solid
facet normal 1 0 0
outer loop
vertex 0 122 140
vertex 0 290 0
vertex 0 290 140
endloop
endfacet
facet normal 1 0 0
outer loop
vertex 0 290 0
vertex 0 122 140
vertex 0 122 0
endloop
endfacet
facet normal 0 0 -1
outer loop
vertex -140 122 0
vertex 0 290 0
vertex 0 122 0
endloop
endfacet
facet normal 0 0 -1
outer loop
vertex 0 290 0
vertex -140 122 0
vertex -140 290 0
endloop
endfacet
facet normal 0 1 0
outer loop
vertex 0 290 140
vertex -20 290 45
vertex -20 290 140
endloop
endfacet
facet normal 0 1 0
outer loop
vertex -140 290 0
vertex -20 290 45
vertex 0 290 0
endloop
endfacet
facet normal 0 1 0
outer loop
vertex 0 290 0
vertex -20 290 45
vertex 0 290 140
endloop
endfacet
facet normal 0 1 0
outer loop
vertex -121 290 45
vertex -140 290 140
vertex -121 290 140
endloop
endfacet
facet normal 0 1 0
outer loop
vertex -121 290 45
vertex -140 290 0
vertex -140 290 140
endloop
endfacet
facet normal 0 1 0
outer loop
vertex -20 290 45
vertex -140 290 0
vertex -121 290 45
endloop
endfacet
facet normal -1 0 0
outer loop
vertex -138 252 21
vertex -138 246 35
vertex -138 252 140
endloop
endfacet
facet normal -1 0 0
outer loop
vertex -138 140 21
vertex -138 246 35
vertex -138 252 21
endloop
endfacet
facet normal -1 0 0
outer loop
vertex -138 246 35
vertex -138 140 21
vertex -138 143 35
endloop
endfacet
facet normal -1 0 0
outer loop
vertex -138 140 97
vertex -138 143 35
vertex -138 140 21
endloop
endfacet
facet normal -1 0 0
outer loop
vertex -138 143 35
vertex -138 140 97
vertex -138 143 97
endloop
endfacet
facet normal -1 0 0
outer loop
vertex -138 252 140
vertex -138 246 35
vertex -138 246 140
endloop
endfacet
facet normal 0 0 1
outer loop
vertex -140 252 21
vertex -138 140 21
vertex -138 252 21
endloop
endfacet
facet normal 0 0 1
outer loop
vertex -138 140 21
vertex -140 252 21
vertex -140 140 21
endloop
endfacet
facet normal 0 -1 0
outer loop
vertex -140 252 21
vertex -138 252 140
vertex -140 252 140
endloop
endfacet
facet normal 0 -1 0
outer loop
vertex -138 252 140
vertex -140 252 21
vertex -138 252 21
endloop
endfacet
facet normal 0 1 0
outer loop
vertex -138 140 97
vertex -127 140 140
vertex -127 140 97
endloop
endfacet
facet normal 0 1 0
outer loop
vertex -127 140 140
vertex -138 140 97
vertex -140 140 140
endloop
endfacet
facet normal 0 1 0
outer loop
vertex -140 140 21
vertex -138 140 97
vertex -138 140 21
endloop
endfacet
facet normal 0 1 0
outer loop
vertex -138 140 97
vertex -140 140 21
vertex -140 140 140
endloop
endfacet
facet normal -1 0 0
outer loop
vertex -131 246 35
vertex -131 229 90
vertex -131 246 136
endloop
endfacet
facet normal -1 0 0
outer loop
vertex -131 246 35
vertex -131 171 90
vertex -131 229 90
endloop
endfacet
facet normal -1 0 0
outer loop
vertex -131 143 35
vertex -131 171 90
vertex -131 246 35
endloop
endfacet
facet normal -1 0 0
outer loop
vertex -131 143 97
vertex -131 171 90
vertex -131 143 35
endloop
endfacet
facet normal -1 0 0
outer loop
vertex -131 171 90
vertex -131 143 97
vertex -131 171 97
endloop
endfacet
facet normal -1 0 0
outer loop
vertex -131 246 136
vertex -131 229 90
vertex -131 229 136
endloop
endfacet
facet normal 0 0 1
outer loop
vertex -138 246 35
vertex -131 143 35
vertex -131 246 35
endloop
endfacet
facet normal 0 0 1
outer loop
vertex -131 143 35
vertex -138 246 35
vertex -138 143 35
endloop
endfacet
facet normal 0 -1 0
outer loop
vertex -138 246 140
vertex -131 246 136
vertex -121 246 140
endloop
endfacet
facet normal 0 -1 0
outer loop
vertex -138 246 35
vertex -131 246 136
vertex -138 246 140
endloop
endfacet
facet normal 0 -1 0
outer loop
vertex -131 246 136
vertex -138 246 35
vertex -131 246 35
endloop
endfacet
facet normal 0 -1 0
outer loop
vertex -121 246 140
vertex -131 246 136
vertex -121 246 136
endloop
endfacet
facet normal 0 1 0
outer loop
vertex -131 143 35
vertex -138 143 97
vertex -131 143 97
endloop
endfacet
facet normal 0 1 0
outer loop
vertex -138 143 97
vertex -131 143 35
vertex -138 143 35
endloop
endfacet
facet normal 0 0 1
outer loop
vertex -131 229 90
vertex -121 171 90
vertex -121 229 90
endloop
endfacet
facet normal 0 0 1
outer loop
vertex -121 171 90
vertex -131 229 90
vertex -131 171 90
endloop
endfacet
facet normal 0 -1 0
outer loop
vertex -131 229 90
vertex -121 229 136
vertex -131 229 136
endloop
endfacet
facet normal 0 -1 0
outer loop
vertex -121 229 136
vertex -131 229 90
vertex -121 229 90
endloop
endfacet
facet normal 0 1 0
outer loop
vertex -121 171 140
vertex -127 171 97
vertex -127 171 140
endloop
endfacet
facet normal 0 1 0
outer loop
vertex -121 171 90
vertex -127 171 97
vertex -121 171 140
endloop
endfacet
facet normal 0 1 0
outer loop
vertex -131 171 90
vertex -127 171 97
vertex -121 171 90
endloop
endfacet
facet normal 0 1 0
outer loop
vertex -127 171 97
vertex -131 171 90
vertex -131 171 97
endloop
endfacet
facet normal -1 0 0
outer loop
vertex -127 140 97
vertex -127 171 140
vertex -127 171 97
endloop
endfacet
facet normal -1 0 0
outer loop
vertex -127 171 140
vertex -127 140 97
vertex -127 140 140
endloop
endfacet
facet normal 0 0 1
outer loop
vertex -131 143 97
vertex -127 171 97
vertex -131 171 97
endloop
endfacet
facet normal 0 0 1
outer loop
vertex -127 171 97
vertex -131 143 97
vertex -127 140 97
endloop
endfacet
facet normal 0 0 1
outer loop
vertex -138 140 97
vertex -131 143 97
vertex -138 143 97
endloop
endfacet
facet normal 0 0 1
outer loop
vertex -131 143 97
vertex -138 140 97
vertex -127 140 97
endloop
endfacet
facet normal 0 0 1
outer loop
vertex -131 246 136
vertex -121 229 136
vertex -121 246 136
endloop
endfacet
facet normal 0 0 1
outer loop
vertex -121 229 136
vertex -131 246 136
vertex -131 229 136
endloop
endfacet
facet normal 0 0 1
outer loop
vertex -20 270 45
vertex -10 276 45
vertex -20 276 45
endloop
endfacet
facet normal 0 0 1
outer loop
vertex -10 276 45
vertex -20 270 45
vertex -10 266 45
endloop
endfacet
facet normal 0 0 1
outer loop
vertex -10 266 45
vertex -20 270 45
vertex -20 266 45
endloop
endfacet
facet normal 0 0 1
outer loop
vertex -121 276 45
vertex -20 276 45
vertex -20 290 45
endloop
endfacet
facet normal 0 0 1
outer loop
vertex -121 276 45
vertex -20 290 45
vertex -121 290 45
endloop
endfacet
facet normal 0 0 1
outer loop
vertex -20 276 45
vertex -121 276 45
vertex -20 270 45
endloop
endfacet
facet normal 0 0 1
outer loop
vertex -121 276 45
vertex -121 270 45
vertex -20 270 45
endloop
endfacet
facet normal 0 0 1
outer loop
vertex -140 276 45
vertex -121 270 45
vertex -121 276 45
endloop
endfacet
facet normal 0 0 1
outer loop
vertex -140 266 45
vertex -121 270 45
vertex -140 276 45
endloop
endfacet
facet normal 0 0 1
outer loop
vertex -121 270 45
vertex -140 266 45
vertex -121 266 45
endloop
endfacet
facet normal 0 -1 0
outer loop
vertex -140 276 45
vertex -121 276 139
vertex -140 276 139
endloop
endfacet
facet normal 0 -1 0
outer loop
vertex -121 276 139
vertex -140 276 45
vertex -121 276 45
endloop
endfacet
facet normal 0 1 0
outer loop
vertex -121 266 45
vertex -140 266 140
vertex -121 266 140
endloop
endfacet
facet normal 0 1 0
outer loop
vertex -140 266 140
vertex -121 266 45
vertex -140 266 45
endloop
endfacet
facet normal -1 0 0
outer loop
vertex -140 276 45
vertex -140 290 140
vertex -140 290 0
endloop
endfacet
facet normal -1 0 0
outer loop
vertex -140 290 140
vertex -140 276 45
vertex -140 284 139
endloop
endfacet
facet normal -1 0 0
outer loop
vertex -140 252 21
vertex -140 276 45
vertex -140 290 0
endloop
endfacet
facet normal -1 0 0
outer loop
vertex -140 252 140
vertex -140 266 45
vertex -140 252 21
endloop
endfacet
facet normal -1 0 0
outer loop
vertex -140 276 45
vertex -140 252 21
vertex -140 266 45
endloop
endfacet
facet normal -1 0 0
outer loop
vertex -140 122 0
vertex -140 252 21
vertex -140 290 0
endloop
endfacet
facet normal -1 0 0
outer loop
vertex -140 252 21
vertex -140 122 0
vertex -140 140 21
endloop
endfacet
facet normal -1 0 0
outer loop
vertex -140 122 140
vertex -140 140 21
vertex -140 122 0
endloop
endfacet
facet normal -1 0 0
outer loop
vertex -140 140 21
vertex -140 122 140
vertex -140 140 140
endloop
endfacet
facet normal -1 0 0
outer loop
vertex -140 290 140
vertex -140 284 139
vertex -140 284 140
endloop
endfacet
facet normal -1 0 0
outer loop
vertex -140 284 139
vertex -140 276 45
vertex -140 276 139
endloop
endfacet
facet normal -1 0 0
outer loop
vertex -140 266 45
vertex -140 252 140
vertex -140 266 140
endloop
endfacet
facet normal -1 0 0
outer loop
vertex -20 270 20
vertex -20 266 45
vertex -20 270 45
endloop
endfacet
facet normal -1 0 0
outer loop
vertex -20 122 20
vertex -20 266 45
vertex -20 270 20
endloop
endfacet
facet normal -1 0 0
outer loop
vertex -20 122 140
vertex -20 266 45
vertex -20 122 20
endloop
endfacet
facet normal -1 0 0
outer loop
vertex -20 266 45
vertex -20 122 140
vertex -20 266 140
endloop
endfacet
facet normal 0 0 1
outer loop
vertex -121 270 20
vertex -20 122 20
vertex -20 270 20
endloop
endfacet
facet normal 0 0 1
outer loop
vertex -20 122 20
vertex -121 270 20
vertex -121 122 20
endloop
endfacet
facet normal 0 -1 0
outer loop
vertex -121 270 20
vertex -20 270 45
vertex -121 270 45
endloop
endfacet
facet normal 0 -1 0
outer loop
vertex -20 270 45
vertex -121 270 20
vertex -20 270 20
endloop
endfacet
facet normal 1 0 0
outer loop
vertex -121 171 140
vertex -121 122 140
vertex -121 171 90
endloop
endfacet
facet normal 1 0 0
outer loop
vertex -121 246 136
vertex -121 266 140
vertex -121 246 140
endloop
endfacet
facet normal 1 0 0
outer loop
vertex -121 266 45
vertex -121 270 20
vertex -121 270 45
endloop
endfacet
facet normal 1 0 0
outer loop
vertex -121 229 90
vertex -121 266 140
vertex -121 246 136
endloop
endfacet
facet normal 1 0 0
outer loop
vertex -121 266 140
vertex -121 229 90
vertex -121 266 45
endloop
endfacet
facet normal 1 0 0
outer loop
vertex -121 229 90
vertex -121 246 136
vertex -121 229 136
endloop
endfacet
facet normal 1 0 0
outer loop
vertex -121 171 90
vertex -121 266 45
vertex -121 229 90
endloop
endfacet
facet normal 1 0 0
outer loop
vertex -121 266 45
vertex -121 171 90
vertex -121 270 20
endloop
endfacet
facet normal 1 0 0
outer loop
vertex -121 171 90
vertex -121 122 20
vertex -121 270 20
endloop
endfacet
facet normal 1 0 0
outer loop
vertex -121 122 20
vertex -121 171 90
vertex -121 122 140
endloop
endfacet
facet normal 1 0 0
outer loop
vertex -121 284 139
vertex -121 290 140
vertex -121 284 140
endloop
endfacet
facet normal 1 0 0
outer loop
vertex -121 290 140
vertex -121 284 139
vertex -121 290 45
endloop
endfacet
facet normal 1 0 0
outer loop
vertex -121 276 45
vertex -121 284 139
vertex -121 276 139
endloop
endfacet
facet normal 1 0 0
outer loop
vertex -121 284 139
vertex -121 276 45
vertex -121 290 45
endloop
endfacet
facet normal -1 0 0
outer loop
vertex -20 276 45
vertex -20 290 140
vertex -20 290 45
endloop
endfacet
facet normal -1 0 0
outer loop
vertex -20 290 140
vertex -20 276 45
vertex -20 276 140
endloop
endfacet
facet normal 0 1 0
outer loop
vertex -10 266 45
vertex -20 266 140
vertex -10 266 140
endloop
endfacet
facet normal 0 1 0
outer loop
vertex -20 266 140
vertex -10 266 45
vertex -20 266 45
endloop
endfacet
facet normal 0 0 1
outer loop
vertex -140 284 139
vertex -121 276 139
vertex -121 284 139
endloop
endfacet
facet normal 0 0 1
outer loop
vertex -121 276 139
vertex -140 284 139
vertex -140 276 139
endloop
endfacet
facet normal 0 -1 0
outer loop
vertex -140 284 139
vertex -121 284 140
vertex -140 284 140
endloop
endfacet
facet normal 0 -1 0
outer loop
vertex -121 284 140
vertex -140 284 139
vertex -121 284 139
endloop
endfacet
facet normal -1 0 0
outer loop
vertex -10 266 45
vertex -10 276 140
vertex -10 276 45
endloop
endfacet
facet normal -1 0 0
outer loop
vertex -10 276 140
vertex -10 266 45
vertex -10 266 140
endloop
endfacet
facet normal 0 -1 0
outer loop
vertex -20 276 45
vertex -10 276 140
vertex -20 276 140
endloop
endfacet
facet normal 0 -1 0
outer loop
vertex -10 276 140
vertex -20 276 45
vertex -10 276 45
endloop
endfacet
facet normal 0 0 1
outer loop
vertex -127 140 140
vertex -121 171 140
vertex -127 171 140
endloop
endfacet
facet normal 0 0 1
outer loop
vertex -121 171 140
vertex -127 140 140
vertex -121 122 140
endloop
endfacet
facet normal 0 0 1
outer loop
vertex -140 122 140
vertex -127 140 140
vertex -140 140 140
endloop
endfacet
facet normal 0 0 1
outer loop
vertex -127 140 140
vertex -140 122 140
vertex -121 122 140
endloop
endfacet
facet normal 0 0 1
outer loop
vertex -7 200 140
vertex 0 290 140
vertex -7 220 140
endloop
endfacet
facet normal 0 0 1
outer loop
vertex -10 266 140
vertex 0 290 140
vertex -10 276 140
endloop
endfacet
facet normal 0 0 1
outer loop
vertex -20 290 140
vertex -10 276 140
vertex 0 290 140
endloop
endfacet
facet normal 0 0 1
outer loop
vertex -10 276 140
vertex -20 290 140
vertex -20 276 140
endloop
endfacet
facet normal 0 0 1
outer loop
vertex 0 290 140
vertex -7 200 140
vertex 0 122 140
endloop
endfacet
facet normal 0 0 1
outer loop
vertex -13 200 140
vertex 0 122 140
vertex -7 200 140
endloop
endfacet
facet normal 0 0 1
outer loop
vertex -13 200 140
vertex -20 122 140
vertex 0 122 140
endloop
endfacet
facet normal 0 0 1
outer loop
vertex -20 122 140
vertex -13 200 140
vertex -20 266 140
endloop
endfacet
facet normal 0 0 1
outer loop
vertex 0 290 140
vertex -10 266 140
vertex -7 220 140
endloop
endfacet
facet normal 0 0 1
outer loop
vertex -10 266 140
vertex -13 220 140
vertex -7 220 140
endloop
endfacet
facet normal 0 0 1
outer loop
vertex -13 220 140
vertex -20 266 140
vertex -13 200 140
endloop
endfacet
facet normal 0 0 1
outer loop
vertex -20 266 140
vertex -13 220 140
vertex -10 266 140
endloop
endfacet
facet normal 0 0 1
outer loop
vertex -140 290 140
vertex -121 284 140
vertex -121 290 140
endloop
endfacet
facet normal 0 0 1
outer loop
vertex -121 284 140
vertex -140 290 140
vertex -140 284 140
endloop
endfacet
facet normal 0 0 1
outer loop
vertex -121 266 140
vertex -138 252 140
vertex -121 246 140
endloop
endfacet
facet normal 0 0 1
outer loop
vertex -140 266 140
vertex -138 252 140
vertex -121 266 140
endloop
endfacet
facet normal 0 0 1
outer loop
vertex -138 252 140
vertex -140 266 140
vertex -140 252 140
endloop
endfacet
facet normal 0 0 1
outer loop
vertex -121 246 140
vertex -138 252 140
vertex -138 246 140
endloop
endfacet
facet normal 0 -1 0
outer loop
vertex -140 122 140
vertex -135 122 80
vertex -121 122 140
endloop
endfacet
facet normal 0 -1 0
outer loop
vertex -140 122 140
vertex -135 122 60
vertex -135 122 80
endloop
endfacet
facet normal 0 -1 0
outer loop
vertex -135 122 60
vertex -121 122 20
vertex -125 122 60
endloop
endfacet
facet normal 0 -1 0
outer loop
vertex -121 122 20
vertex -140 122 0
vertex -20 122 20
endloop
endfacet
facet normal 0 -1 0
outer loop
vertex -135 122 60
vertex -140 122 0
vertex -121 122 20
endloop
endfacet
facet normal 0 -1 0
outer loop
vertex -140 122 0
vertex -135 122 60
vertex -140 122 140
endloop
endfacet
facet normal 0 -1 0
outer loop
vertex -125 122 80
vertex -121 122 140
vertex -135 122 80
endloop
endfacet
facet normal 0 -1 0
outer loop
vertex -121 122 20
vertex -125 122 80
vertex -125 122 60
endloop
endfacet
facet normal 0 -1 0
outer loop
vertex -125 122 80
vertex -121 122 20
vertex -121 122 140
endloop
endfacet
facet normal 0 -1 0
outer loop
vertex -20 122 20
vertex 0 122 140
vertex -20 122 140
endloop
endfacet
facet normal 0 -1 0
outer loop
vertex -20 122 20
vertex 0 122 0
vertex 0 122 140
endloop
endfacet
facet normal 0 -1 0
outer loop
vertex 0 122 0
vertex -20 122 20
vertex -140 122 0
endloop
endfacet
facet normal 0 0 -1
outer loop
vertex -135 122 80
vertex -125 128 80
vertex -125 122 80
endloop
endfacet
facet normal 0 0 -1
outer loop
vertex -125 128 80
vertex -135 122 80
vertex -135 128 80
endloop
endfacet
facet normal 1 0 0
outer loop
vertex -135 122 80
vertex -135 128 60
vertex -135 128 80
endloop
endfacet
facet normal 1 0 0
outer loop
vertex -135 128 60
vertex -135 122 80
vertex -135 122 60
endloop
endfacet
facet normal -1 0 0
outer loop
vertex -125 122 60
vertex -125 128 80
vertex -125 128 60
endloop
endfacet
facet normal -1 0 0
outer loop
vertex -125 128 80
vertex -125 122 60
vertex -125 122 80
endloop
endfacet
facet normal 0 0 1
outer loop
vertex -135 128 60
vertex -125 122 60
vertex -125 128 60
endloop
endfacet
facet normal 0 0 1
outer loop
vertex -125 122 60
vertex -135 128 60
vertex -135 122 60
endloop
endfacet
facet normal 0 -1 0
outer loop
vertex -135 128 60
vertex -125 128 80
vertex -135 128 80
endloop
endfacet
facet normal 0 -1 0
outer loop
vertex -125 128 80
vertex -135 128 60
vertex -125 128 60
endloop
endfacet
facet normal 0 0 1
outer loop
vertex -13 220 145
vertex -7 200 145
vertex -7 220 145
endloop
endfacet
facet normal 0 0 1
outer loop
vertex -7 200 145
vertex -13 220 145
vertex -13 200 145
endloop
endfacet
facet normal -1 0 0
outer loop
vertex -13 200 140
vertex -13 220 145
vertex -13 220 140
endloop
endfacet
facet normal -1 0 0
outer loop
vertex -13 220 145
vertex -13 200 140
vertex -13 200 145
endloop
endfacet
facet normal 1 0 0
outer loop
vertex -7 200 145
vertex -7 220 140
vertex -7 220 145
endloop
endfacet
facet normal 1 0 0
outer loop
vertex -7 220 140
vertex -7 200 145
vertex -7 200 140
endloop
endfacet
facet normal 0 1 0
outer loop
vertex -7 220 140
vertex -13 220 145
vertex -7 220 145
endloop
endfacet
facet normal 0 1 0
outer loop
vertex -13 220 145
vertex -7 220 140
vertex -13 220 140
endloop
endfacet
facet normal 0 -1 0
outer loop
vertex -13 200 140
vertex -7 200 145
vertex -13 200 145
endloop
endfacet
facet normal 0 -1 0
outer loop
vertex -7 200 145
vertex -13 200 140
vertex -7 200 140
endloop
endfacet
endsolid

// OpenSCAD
rotate(a=90,v=[0,-1,0]) {
difference() {
    union() {
        difference() {
            cube([235,290,80]); // bottom
            
            union() {
                translate([168,20,78])
                cube([53,74,3]);    // nfc
                translate([180,94,78])
                cube([29,35,3]);    // nfc module
                translate([187,122,78])
                cube([14,20,3]);    // nfc line
                
                translate([50,-1,30])
                cube([57,11,5]);    // printer
            }
        }
        
        translate([0,60,80])
        rotate(a=90,v=[0,1,0]) {
            cylinder(r=60,h=140,$fn=50);    // front
        }
        
        difference() {
            translate([0,60,80])
            cube([140,65,60]);  // front2
        }
        
        difference() {
            translate([0,122,80])
            cube([235,168,60]); // back
            
            union() {
                translate([187,122,79])
                cube([14,20,6]);    // nfc line
                
                translate([21,140,138])
                cube([193,112,3]);  // lcd
                translate([35,143,131])
                cube([167,103,8]);  // lcd bottom
                translate([90,171,120])
                cube([65,58,15]);   // lcd module
                translate([97,140,127])
                cube([44,32,13]);    // lcd line
                translate([136,228,120])
                cube([5,18,15]);
                
                translate([45,266,120])
                cube([145,10,21]);  // back lid
            }
        }
    }
    
    union() {
        translate([20,10,20])
        cube([195,260,40]); // inside bottom
        
        translate([20,10,60])
        cube([113,130,27]); // inside printer
        translate([20,120,60])
        cube([195,150,61]); // inside lcd
        
        translate([45,266,20])
        cube([145,25,101]); // inside back lid
        translate([139,275,120])
        cube([30,9,21]);    // inside pan
        translate([45,266,10])
        cube([145,10,11]);  // inside bottom lid
        
        translate([140,-1,-1])
        cube([96,292,142]);
        translate([-1,-1,-1])
        cube([141,123,142]);
        
        translate([132,121,60])
        cube([9,20,27]);   // 133+7,122+18,60+27
        
        translate([60,121,125])
        cube([20,7,10]);        // in
    }
}

translate([139,200,7])
cube([6,20,6]);        // on
}
